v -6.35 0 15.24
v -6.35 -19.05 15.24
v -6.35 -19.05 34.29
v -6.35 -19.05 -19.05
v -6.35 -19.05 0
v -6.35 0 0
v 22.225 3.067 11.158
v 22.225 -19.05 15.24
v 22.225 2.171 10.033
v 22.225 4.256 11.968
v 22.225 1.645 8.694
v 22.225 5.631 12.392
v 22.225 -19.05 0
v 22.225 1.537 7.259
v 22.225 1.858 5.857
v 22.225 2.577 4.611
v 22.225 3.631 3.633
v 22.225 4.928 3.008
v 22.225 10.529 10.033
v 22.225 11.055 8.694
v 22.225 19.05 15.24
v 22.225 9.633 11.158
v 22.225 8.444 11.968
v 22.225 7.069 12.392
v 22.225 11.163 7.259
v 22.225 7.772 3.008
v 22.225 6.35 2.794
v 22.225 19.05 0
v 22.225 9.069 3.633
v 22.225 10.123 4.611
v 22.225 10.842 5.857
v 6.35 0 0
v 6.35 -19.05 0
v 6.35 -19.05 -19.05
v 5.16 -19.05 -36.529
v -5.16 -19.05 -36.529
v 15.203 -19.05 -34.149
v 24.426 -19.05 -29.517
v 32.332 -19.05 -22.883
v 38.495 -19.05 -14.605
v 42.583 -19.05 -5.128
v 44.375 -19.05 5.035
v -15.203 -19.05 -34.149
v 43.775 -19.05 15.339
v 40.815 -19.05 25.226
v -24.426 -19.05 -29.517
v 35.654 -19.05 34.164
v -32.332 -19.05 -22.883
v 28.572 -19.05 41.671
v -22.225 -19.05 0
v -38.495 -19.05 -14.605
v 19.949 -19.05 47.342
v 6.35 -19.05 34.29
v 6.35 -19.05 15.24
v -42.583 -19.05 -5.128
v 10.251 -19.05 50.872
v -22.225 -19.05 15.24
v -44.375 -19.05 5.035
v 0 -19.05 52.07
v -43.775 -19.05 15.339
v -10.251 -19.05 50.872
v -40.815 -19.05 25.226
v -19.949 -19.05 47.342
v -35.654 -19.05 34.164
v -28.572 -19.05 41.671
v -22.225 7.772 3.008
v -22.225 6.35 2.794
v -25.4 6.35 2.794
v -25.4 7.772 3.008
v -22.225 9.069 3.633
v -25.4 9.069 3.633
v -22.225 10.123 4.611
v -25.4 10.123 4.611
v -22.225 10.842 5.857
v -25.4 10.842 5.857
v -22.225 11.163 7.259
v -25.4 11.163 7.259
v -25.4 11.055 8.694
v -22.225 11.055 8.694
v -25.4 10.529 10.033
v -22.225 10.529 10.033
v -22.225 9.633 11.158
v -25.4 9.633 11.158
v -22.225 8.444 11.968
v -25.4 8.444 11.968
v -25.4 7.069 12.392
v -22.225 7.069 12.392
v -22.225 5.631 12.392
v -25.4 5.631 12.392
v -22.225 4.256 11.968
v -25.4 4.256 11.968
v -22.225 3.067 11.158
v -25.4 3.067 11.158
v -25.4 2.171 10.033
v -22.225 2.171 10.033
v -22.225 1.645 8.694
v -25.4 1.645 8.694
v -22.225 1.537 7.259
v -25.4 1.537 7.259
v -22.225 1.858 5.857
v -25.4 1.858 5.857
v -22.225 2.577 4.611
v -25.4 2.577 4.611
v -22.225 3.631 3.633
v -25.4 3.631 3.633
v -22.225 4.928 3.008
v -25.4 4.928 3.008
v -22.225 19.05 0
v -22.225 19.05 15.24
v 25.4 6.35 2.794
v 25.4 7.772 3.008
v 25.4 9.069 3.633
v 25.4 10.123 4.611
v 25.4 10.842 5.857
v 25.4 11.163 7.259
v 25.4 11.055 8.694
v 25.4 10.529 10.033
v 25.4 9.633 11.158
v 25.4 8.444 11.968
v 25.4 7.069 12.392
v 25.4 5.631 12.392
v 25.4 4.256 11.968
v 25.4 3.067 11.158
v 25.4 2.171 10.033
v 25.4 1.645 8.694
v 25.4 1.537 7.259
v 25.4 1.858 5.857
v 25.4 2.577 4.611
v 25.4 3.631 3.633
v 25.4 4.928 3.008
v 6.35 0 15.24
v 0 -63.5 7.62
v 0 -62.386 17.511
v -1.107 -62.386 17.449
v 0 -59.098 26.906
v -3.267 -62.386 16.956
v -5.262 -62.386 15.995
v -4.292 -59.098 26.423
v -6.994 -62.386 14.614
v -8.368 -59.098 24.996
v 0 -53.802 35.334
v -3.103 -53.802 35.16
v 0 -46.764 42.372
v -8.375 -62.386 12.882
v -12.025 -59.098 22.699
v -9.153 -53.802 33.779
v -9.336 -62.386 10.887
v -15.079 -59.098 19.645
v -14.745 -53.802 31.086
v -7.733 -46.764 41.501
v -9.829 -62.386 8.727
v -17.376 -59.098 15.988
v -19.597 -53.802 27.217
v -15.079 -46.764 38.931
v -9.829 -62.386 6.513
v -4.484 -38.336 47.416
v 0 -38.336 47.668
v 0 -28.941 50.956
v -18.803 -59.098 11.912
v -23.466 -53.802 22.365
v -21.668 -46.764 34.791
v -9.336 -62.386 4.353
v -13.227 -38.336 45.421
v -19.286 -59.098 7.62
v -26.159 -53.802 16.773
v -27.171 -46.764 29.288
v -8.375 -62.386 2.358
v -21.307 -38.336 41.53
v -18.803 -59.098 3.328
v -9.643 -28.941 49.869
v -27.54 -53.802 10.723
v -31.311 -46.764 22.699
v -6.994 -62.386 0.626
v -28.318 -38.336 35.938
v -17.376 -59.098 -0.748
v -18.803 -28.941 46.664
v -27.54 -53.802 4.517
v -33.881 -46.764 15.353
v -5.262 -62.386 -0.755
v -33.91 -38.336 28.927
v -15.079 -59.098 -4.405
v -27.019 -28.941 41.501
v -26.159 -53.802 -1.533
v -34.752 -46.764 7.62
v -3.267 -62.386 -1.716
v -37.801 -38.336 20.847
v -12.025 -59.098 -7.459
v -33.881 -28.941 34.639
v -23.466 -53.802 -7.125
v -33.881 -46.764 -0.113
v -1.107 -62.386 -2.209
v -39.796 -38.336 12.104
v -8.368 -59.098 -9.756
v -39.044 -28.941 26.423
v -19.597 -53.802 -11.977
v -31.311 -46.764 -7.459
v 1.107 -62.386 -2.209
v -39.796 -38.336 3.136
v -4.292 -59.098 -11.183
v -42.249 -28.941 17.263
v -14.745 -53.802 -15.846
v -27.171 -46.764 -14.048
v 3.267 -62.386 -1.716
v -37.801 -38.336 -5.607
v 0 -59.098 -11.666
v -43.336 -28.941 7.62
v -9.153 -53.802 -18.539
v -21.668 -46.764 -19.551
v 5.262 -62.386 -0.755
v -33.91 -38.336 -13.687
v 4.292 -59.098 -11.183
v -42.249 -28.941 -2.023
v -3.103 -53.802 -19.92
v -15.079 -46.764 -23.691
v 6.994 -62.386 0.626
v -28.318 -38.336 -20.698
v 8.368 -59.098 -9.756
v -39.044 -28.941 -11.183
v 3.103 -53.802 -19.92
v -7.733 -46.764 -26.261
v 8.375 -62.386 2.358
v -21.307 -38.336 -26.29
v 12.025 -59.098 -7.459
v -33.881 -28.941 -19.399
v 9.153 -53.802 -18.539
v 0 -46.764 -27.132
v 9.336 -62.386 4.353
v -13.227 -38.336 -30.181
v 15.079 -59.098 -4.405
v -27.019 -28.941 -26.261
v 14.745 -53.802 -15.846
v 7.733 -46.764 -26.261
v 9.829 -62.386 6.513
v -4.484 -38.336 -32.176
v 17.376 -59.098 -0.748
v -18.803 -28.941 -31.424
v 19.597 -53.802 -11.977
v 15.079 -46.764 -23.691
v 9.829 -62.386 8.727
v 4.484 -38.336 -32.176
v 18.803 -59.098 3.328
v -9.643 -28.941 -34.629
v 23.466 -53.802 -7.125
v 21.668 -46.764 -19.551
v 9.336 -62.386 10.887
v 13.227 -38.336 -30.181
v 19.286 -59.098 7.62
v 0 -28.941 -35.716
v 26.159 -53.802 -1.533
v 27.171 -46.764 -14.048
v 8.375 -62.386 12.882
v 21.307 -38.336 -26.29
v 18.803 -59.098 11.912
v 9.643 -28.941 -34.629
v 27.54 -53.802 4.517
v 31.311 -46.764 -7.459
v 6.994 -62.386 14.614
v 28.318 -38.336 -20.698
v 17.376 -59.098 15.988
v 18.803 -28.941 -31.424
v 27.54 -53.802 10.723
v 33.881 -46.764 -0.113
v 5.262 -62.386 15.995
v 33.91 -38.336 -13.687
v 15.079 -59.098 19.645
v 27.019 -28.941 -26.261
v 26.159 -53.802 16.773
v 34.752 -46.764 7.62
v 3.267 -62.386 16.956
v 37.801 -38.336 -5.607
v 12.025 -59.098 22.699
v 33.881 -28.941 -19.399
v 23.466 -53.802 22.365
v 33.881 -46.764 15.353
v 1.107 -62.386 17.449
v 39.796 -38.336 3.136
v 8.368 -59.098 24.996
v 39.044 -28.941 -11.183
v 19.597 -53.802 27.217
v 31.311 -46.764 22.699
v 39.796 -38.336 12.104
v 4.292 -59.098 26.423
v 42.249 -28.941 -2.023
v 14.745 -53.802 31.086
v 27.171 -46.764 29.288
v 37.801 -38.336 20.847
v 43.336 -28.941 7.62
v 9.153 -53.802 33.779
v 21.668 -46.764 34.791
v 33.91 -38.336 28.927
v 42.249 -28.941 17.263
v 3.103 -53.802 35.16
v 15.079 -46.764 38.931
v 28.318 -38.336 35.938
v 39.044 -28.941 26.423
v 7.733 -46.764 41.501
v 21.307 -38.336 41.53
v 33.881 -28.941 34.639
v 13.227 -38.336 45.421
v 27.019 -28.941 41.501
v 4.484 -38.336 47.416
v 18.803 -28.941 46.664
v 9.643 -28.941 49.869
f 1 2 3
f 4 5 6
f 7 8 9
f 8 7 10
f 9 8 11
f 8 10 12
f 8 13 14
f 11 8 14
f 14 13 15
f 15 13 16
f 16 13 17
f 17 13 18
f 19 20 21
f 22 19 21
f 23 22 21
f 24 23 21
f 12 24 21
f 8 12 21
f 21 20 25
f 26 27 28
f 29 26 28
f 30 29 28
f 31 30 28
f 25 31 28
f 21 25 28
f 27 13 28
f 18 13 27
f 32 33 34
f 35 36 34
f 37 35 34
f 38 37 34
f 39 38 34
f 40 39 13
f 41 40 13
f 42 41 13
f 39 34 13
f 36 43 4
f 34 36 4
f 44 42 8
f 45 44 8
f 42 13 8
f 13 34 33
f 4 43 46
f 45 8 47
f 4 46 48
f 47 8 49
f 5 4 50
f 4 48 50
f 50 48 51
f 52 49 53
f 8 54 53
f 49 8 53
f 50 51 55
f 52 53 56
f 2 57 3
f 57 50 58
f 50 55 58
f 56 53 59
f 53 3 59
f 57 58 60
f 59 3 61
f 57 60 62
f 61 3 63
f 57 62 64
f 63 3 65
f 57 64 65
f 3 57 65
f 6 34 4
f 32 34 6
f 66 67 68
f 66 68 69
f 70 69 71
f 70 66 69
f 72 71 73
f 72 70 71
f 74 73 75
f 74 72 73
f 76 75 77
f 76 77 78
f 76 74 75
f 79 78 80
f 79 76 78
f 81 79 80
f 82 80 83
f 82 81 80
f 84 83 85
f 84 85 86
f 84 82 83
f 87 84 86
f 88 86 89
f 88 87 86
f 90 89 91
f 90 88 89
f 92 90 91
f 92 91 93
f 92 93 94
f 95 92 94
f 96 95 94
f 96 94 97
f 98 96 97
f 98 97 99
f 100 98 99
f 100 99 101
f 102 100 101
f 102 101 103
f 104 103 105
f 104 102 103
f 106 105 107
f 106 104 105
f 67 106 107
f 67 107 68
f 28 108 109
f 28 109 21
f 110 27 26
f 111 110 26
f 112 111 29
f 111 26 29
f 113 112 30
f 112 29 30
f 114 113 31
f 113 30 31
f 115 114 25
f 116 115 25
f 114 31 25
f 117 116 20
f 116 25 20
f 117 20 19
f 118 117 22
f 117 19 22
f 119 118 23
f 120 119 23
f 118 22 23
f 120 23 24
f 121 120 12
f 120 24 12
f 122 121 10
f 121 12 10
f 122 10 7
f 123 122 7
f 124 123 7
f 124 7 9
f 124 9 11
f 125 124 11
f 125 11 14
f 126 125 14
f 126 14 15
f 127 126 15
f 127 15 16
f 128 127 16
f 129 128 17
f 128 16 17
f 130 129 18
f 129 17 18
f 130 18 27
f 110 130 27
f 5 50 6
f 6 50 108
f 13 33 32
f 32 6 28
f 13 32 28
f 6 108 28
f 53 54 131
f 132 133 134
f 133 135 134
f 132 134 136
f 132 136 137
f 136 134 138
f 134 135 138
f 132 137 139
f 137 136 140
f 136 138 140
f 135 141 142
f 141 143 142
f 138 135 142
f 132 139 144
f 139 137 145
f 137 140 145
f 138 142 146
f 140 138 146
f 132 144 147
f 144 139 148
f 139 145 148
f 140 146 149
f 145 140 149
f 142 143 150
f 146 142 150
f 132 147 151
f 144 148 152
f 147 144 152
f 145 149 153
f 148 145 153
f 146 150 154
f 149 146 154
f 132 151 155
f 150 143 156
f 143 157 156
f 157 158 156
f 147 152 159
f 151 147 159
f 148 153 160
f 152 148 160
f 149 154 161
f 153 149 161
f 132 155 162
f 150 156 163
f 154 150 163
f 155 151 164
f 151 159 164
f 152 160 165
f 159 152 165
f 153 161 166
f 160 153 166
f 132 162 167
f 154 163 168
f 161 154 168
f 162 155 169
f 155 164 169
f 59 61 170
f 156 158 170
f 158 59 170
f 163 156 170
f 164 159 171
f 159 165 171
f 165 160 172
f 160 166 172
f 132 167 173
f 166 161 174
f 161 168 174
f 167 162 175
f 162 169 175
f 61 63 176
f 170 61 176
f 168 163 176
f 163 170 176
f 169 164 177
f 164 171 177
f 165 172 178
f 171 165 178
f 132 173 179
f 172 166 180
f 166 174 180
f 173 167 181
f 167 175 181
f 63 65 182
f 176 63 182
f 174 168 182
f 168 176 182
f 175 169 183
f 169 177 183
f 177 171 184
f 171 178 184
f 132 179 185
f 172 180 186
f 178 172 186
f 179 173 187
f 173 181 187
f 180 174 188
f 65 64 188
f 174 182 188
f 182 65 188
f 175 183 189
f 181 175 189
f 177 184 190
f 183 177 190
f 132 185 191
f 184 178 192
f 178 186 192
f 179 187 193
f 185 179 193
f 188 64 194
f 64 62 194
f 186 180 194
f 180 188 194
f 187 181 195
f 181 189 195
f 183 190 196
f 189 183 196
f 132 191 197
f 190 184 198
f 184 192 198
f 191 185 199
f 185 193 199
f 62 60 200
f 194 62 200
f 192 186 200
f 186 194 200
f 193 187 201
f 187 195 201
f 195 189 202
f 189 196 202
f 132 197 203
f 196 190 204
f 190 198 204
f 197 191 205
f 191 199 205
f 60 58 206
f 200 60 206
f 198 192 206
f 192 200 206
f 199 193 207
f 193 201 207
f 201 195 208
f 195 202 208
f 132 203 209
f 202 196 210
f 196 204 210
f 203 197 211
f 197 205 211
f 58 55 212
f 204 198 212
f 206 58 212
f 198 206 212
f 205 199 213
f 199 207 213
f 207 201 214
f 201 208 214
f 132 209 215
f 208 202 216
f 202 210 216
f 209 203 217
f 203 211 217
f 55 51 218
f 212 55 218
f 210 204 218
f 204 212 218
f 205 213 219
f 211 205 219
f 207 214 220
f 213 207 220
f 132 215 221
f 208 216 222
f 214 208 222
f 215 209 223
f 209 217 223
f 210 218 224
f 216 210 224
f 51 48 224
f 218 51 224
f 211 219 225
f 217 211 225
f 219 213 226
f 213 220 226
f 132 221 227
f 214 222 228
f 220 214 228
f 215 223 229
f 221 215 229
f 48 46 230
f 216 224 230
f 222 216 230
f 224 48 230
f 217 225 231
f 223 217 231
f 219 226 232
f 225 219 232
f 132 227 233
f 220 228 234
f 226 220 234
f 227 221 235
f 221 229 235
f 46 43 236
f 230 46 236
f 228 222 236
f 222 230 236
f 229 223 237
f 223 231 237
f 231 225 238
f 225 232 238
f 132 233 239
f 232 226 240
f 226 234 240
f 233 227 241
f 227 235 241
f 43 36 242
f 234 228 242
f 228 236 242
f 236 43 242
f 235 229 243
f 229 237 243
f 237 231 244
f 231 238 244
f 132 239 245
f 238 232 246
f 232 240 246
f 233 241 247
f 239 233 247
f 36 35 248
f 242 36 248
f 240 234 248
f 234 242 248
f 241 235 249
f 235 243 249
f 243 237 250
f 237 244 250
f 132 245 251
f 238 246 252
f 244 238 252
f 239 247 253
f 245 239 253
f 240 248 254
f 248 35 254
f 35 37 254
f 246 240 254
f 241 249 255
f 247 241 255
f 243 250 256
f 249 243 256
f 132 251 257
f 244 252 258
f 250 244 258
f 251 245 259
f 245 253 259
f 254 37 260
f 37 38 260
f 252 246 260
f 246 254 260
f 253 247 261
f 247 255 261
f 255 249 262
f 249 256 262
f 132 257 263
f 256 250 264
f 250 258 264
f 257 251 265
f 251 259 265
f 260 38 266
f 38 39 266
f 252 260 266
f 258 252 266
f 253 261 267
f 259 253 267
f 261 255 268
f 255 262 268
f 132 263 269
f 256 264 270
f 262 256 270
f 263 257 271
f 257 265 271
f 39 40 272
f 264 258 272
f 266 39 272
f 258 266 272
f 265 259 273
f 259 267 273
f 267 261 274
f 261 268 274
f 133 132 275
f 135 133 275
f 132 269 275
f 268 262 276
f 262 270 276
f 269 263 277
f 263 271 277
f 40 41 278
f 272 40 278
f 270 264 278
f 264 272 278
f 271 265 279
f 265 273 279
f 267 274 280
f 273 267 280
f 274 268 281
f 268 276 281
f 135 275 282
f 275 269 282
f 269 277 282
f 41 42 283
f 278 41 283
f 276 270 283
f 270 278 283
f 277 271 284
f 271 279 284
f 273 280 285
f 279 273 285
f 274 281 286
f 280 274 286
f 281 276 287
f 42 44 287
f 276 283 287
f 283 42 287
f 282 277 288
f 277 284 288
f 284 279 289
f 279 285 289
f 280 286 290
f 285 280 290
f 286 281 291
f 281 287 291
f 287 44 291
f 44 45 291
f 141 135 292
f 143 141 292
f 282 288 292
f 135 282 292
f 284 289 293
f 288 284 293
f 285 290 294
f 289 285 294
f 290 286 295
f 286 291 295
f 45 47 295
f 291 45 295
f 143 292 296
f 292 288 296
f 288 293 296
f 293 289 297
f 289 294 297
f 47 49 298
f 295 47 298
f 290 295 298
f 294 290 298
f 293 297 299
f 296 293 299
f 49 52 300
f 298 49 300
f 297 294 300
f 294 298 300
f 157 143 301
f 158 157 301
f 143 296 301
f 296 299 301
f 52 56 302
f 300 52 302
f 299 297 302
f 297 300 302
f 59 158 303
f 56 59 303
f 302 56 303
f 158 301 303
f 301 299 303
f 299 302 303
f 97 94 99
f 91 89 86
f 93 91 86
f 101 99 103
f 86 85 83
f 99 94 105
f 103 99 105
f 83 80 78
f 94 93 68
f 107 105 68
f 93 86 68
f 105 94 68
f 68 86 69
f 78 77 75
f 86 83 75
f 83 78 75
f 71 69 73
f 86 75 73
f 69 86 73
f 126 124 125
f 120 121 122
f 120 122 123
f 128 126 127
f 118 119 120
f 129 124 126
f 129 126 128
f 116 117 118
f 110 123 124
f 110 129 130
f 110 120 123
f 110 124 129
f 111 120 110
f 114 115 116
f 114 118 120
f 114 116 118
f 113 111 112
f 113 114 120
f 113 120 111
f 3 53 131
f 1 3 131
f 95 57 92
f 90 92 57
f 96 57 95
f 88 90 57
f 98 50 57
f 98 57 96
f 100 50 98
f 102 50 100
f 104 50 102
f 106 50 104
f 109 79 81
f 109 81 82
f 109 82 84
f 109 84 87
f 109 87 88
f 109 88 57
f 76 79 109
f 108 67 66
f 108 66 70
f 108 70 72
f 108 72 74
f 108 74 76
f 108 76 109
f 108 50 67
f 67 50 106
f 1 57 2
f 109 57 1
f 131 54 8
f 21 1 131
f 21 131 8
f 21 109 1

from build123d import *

# Parameters (mm, degrees)
SKETCH1_W           = 44.45
SKETCH1_H           = 38.1
BOSS_EXTRUDE1_DEPTH = 15.24
SKETCH2_R           = 4.826
BOSS_EXTRUDE2_DEPTH = 3.175
BOSS_EXTRUDE3_DEPTH = 6.35


with BuildPart() as part:
    # Sketch1 → Boss-Extrude1 (new body)
    with BuildSketch(Plane.XY):
        Rectangle(SKETCH1_W, SKETCH1_H)
    extrude(amount=BOSS_EXTRUDE1_DEPTH)

    # Sketch2 → Boss-Extrude2 (add)
    with BuildSketch(Plane(origin=(22.225, 0, 0), x_dir=(0, 0, -1), z_dir=(1, 0, 0))):
        with Locations((-7.62, 6.35)):
            Circle(SKETCH2_R)
    boss_extrude2 = extrude(amount=BOSS_EXTRUDE2_DEPTH)

    # Mirror1: Boss-Extrude2 across plane
    add(boss_extrude2.mirror(Plane(origin=(0, 0, 0), x_dir=(0, 0, 1), z_dir=(1, 0, 0))))

    # Sketch5 → Revolve1 (revolve)
    with BuildSketch(Plane(origin=(0, 0, 0), x_dir=(0, 0, -1), z_dir=(1, 0, 0))):
        with BuildLine():
            Line((-52.07, -19.05), (-7.62, -19.05))
            Line((-7.62, -19.05), (-7.62, -63.5))
            ThreePointArc((-7.62, -63.5), (-39.050896424, -50.480896424), (-52.07, -19.05))
        make_face()
    revolve(axis=Axis((0, -19.05, 7.62), (0, -1, 0)))

    # Sketch7 → Boss-Extrude3 (add, symmetric)
    with BuildSketch(Plane(origin=(0, 0, 0), x_dir=(0, 0, -1), z_dir=(1, 0, 0))):
        Polygon((-15.24, 0), (-15.24, -19.05), (-34.29, -19.05), align=None)
    boss_extrude3 = extrude(amount=BOSS_EXTRUDE3_DEPTH, both=True)

    # Mirror3: Boss-Extrude3 across plane
    add(boss_extrude3.mirror(Plane.XY.offset(7.62)))


solid = part.part
